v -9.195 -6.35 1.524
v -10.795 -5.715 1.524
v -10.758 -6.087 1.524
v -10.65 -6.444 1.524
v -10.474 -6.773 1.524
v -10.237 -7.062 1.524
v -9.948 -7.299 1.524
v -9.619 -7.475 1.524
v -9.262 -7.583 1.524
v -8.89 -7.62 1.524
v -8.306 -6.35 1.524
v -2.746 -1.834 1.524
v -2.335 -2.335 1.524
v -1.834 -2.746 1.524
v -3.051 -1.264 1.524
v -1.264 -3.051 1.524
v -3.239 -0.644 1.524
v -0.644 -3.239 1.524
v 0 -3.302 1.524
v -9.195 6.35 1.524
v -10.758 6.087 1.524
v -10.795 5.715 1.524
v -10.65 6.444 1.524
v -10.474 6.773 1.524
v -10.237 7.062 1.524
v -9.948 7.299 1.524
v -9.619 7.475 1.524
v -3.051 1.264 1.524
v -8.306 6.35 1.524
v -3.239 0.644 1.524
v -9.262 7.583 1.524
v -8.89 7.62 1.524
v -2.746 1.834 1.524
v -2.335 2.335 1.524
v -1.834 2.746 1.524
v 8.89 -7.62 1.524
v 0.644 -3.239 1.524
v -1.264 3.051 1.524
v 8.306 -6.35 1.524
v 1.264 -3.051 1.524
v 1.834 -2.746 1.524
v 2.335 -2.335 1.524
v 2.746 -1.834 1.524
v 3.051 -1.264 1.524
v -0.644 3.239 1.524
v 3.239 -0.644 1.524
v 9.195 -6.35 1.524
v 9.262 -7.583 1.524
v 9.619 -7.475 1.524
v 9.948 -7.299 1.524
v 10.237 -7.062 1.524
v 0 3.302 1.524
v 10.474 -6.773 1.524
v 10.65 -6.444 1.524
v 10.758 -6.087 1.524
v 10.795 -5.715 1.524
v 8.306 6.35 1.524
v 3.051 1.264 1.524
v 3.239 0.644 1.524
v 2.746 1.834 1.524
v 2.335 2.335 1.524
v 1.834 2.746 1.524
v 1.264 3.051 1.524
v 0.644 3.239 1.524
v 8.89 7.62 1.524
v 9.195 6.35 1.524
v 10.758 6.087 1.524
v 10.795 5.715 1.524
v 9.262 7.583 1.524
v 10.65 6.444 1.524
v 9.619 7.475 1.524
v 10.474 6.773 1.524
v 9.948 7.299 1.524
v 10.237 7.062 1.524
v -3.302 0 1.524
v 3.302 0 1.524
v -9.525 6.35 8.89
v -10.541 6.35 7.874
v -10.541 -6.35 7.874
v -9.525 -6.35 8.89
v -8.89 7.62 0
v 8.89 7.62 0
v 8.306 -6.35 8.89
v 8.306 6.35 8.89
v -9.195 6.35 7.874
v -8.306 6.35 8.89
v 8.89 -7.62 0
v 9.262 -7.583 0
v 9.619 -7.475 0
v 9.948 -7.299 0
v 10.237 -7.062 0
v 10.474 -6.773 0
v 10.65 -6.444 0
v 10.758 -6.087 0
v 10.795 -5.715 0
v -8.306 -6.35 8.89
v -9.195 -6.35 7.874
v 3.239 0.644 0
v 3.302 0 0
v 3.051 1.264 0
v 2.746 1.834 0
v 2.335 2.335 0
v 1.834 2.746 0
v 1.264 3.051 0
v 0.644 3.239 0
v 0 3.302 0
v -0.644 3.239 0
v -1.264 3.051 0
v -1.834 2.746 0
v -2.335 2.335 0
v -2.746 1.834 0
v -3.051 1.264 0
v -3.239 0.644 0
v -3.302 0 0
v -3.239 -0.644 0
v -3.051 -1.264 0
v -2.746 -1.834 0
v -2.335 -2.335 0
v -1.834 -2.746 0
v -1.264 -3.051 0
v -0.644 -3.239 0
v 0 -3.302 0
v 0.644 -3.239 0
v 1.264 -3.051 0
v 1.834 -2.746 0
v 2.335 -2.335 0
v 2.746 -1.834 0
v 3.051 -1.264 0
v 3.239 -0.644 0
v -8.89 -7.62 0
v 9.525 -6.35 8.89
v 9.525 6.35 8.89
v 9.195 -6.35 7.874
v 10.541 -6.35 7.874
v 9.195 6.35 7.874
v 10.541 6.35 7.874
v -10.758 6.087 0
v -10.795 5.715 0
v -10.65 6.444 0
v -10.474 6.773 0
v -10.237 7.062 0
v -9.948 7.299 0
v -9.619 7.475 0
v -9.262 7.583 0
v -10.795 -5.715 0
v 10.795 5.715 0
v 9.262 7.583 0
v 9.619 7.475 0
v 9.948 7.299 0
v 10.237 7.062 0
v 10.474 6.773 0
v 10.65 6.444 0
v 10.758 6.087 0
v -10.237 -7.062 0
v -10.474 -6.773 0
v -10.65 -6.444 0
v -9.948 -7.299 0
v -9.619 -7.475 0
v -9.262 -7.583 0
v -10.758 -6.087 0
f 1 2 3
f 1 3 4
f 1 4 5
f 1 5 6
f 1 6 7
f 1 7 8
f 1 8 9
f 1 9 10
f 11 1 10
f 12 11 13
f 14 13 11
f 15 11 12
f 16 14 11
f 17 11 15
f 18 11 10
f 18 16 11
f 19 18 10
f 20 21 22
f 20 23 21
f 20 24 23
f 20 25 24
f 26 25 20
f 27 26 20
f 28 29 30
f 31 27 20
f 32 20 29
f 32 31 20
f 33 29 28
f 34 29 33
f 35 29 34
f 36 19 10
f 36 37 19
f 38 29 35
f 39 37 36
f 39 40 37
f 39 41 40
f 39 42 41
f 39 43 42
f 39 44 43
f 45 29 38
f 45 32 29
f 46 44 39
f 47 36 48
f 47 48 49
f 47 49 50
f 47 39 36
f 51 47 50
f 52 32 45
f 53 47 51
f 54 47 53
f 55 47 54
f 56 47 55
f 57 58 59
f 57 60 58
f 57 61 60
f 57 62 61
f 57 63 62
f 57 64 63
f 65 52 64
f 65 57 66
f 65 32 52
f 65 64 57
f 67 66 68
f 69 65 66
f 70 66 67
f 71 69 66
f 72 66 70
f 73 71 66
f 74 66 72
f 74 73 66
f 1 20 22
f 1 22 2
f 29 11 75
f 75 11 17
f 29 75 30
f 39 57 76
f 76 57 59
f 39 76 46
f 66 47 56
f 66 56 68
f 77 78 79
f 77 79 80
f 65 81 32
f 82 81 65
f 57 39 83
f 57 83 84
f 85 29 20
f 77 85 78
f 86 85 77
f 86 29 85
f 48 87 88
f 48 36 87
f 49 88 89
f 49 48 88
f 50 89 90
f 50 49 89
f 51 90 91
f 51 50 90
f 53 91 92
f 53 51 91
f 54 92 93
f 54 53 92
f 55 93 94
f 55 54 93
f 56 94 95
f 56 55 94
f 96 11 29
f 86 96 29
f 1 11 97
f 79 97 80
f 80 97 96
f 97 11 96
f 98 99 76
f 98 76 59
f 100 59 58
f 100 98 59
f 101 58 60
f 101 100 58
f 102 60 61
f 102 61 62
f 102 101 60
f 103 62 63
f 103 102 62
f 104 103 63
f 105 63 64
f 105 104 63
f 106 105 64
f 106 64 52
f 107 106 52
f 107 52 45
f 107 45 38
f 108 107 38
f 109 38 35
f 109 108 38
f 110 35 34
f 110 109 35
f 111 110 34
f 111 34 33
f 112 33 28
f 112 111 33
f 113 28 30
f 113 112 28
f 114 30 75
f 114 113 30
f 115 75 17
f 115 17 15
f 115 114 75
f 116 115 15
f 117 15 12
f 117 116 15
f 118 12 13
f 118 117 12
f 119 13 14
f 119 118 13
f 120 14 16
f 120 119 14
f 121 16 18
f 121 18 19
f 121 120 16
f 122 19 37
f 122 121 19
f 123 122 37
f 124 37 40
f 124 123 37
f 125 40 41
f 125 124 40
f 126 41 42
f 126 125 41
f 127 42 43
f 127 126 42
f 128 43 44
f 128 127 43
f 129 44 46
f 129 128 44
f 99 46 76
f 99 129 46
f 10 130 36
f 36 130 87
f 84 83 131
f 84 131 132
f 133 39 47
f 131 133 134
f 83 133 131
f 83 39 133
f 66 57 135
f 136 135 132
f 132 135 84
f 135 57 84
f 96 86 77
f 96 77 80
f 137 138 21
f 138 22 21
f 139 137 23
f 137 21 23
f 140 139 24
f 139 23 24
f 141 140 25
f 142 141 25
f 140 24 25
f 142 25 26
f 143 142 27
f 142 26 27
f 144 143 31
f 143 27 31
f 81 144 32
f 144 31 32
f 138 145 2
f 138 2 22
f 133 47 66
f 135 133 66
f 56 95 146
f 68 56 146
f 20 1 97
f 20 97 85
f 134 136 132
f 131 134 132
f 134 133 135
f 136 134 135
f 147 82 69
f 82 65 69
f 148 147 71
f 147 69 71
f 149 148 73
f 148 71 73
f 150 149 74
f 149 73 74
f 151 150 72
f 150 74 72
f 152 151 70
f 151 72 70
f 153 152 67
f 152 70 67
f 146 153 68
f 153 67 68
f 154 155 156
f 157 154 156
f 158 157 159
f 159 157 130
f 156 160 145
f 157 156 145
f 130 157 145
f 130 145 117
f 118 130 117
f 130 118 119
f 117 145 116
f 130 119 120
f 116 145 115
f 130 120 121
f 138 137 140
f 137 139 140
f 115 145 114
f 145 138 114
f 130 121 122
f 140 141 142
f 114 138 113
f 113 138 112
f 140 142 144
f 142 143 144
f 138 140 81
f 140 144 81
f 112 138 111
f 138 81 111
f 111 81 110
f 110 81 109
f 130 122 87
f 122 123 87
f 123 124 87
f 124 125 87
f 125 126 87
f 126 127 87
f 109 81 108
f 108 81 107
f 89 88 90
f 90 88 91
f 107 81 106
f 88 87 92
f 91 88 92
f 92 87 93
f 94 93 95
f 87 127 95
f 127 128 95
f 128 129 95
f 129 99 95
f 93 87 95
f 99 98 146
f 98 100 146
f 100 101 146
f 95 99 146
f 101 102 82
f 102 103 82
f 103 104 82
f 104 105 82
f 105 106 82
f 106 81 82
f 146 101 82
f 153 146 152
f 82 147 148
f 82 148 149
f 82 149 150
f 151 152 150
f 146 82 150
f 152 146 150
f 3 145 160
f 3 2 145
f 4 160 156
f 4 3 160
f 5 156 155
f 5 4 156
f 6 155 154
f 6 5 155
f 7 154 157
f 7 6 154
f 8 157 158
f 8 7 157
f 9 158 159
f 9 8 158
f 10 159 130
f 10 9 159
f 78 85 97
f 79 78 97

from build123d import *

# Parameters (mm, degrees)
F0_W        = 21.59
F0_H        = 15.24
F0_W_2      = 0.889
F0_H_2      = 12.7
F0_R        = 3.302
F1_DEPTH    = 1.524
F2_DEPTH    = 8.89
F3_W        = 12.7
F3_H        = 1.016
F5_DEPTH    = 1.6002
F4_W        = 12.7
F4_H        = 1.016
F6_DEPTH    = 1.6002
F7_T1_DEPTH = 19.2320747894
F8_R        = 1.905


# Not quite as in the source:
# - a fillet or chamfer that OpenCascade refuses, or shapes differently, is made with other operations: its cross-section is extruded or revolved along the edge and cut away or added


with BuildPart() as f1:
    # F0 (on Top) → F1 (new body)
    with BuildSketch(Plane.XY):
        Rectangle(F0_W, F0_H)
        with Locations((-8.7503, 0)):
            Rectangle(F0_W_2, F0_H_2, mode=Mode.SUBTRACT)
        Circle(F0_R, mode=Mode.SUBTRACT)
        with Locations((8.7503, 0)):
            Rectangle(F0_W_2, F0_H_2, mode=Mode.SUBTRACT)
    extrude(amount=F1_DEPTH)

    # F0 (on Top) → F2 (join)
    with BuildSketch(Plane.XY):
        with Locations((-8.7503, 0)):
            Rectangle(F0_W_2, F0_H_2)
        with Locations((8.7503, 0)):
            Rectangle(F0_W_2, F0_H_2)
    extrude(amount=F2_DEPTH)

    # F3 (on face) → F5 (join)
    with BuildSketch(Plane(origin=(-9.1948, 0, 0), x_dir=(0, -1, 0), z_dir=(-1, 0, 0))):
        with Locations((0, 8.382)):
            Rectangle(F3_W, F3_H)
    extrude(amount=F5_DEPTH)

    # F4 (on face) → F6 (join)
    with BuildSketch(Plane.YZ.offset(9.1948)):
        with Locations((0, 8.382)):
            Rectangle(F4_W, F4_H)
    extrude(amount=F6_DEPTH)

    # F7: chamfer of 1.27 on 2 edges, made by hand

    # F7_s2 → F7_t1 (cut)
    with BuildSketch(Plane.XZ.offset(-9.6160373947)):
        Polygon((-10.795, 7.62), (-9.525, 8.89), (-10.795, 8.89), align=None)
        Polygon((10.795, 7.62), (9.525, 8.89), (10.795, 8.89), align=None)
    extrude(amount=F7_T1_DEPTH, mode=Mode.SUBTRACT)

    # F8
    f8_edges = [f1.edges().sort_by_distance(p)[0] for p in [
        (10.795, -7.62, 0.762),
        (10.795, 7.62, 0.762),
        (-10.795, 7.62, 0.762),
        (-10.795, -7.62, 0.762),
    ]]
    fillet(f8_edges, radius=F8_R)


solid = f1.part
